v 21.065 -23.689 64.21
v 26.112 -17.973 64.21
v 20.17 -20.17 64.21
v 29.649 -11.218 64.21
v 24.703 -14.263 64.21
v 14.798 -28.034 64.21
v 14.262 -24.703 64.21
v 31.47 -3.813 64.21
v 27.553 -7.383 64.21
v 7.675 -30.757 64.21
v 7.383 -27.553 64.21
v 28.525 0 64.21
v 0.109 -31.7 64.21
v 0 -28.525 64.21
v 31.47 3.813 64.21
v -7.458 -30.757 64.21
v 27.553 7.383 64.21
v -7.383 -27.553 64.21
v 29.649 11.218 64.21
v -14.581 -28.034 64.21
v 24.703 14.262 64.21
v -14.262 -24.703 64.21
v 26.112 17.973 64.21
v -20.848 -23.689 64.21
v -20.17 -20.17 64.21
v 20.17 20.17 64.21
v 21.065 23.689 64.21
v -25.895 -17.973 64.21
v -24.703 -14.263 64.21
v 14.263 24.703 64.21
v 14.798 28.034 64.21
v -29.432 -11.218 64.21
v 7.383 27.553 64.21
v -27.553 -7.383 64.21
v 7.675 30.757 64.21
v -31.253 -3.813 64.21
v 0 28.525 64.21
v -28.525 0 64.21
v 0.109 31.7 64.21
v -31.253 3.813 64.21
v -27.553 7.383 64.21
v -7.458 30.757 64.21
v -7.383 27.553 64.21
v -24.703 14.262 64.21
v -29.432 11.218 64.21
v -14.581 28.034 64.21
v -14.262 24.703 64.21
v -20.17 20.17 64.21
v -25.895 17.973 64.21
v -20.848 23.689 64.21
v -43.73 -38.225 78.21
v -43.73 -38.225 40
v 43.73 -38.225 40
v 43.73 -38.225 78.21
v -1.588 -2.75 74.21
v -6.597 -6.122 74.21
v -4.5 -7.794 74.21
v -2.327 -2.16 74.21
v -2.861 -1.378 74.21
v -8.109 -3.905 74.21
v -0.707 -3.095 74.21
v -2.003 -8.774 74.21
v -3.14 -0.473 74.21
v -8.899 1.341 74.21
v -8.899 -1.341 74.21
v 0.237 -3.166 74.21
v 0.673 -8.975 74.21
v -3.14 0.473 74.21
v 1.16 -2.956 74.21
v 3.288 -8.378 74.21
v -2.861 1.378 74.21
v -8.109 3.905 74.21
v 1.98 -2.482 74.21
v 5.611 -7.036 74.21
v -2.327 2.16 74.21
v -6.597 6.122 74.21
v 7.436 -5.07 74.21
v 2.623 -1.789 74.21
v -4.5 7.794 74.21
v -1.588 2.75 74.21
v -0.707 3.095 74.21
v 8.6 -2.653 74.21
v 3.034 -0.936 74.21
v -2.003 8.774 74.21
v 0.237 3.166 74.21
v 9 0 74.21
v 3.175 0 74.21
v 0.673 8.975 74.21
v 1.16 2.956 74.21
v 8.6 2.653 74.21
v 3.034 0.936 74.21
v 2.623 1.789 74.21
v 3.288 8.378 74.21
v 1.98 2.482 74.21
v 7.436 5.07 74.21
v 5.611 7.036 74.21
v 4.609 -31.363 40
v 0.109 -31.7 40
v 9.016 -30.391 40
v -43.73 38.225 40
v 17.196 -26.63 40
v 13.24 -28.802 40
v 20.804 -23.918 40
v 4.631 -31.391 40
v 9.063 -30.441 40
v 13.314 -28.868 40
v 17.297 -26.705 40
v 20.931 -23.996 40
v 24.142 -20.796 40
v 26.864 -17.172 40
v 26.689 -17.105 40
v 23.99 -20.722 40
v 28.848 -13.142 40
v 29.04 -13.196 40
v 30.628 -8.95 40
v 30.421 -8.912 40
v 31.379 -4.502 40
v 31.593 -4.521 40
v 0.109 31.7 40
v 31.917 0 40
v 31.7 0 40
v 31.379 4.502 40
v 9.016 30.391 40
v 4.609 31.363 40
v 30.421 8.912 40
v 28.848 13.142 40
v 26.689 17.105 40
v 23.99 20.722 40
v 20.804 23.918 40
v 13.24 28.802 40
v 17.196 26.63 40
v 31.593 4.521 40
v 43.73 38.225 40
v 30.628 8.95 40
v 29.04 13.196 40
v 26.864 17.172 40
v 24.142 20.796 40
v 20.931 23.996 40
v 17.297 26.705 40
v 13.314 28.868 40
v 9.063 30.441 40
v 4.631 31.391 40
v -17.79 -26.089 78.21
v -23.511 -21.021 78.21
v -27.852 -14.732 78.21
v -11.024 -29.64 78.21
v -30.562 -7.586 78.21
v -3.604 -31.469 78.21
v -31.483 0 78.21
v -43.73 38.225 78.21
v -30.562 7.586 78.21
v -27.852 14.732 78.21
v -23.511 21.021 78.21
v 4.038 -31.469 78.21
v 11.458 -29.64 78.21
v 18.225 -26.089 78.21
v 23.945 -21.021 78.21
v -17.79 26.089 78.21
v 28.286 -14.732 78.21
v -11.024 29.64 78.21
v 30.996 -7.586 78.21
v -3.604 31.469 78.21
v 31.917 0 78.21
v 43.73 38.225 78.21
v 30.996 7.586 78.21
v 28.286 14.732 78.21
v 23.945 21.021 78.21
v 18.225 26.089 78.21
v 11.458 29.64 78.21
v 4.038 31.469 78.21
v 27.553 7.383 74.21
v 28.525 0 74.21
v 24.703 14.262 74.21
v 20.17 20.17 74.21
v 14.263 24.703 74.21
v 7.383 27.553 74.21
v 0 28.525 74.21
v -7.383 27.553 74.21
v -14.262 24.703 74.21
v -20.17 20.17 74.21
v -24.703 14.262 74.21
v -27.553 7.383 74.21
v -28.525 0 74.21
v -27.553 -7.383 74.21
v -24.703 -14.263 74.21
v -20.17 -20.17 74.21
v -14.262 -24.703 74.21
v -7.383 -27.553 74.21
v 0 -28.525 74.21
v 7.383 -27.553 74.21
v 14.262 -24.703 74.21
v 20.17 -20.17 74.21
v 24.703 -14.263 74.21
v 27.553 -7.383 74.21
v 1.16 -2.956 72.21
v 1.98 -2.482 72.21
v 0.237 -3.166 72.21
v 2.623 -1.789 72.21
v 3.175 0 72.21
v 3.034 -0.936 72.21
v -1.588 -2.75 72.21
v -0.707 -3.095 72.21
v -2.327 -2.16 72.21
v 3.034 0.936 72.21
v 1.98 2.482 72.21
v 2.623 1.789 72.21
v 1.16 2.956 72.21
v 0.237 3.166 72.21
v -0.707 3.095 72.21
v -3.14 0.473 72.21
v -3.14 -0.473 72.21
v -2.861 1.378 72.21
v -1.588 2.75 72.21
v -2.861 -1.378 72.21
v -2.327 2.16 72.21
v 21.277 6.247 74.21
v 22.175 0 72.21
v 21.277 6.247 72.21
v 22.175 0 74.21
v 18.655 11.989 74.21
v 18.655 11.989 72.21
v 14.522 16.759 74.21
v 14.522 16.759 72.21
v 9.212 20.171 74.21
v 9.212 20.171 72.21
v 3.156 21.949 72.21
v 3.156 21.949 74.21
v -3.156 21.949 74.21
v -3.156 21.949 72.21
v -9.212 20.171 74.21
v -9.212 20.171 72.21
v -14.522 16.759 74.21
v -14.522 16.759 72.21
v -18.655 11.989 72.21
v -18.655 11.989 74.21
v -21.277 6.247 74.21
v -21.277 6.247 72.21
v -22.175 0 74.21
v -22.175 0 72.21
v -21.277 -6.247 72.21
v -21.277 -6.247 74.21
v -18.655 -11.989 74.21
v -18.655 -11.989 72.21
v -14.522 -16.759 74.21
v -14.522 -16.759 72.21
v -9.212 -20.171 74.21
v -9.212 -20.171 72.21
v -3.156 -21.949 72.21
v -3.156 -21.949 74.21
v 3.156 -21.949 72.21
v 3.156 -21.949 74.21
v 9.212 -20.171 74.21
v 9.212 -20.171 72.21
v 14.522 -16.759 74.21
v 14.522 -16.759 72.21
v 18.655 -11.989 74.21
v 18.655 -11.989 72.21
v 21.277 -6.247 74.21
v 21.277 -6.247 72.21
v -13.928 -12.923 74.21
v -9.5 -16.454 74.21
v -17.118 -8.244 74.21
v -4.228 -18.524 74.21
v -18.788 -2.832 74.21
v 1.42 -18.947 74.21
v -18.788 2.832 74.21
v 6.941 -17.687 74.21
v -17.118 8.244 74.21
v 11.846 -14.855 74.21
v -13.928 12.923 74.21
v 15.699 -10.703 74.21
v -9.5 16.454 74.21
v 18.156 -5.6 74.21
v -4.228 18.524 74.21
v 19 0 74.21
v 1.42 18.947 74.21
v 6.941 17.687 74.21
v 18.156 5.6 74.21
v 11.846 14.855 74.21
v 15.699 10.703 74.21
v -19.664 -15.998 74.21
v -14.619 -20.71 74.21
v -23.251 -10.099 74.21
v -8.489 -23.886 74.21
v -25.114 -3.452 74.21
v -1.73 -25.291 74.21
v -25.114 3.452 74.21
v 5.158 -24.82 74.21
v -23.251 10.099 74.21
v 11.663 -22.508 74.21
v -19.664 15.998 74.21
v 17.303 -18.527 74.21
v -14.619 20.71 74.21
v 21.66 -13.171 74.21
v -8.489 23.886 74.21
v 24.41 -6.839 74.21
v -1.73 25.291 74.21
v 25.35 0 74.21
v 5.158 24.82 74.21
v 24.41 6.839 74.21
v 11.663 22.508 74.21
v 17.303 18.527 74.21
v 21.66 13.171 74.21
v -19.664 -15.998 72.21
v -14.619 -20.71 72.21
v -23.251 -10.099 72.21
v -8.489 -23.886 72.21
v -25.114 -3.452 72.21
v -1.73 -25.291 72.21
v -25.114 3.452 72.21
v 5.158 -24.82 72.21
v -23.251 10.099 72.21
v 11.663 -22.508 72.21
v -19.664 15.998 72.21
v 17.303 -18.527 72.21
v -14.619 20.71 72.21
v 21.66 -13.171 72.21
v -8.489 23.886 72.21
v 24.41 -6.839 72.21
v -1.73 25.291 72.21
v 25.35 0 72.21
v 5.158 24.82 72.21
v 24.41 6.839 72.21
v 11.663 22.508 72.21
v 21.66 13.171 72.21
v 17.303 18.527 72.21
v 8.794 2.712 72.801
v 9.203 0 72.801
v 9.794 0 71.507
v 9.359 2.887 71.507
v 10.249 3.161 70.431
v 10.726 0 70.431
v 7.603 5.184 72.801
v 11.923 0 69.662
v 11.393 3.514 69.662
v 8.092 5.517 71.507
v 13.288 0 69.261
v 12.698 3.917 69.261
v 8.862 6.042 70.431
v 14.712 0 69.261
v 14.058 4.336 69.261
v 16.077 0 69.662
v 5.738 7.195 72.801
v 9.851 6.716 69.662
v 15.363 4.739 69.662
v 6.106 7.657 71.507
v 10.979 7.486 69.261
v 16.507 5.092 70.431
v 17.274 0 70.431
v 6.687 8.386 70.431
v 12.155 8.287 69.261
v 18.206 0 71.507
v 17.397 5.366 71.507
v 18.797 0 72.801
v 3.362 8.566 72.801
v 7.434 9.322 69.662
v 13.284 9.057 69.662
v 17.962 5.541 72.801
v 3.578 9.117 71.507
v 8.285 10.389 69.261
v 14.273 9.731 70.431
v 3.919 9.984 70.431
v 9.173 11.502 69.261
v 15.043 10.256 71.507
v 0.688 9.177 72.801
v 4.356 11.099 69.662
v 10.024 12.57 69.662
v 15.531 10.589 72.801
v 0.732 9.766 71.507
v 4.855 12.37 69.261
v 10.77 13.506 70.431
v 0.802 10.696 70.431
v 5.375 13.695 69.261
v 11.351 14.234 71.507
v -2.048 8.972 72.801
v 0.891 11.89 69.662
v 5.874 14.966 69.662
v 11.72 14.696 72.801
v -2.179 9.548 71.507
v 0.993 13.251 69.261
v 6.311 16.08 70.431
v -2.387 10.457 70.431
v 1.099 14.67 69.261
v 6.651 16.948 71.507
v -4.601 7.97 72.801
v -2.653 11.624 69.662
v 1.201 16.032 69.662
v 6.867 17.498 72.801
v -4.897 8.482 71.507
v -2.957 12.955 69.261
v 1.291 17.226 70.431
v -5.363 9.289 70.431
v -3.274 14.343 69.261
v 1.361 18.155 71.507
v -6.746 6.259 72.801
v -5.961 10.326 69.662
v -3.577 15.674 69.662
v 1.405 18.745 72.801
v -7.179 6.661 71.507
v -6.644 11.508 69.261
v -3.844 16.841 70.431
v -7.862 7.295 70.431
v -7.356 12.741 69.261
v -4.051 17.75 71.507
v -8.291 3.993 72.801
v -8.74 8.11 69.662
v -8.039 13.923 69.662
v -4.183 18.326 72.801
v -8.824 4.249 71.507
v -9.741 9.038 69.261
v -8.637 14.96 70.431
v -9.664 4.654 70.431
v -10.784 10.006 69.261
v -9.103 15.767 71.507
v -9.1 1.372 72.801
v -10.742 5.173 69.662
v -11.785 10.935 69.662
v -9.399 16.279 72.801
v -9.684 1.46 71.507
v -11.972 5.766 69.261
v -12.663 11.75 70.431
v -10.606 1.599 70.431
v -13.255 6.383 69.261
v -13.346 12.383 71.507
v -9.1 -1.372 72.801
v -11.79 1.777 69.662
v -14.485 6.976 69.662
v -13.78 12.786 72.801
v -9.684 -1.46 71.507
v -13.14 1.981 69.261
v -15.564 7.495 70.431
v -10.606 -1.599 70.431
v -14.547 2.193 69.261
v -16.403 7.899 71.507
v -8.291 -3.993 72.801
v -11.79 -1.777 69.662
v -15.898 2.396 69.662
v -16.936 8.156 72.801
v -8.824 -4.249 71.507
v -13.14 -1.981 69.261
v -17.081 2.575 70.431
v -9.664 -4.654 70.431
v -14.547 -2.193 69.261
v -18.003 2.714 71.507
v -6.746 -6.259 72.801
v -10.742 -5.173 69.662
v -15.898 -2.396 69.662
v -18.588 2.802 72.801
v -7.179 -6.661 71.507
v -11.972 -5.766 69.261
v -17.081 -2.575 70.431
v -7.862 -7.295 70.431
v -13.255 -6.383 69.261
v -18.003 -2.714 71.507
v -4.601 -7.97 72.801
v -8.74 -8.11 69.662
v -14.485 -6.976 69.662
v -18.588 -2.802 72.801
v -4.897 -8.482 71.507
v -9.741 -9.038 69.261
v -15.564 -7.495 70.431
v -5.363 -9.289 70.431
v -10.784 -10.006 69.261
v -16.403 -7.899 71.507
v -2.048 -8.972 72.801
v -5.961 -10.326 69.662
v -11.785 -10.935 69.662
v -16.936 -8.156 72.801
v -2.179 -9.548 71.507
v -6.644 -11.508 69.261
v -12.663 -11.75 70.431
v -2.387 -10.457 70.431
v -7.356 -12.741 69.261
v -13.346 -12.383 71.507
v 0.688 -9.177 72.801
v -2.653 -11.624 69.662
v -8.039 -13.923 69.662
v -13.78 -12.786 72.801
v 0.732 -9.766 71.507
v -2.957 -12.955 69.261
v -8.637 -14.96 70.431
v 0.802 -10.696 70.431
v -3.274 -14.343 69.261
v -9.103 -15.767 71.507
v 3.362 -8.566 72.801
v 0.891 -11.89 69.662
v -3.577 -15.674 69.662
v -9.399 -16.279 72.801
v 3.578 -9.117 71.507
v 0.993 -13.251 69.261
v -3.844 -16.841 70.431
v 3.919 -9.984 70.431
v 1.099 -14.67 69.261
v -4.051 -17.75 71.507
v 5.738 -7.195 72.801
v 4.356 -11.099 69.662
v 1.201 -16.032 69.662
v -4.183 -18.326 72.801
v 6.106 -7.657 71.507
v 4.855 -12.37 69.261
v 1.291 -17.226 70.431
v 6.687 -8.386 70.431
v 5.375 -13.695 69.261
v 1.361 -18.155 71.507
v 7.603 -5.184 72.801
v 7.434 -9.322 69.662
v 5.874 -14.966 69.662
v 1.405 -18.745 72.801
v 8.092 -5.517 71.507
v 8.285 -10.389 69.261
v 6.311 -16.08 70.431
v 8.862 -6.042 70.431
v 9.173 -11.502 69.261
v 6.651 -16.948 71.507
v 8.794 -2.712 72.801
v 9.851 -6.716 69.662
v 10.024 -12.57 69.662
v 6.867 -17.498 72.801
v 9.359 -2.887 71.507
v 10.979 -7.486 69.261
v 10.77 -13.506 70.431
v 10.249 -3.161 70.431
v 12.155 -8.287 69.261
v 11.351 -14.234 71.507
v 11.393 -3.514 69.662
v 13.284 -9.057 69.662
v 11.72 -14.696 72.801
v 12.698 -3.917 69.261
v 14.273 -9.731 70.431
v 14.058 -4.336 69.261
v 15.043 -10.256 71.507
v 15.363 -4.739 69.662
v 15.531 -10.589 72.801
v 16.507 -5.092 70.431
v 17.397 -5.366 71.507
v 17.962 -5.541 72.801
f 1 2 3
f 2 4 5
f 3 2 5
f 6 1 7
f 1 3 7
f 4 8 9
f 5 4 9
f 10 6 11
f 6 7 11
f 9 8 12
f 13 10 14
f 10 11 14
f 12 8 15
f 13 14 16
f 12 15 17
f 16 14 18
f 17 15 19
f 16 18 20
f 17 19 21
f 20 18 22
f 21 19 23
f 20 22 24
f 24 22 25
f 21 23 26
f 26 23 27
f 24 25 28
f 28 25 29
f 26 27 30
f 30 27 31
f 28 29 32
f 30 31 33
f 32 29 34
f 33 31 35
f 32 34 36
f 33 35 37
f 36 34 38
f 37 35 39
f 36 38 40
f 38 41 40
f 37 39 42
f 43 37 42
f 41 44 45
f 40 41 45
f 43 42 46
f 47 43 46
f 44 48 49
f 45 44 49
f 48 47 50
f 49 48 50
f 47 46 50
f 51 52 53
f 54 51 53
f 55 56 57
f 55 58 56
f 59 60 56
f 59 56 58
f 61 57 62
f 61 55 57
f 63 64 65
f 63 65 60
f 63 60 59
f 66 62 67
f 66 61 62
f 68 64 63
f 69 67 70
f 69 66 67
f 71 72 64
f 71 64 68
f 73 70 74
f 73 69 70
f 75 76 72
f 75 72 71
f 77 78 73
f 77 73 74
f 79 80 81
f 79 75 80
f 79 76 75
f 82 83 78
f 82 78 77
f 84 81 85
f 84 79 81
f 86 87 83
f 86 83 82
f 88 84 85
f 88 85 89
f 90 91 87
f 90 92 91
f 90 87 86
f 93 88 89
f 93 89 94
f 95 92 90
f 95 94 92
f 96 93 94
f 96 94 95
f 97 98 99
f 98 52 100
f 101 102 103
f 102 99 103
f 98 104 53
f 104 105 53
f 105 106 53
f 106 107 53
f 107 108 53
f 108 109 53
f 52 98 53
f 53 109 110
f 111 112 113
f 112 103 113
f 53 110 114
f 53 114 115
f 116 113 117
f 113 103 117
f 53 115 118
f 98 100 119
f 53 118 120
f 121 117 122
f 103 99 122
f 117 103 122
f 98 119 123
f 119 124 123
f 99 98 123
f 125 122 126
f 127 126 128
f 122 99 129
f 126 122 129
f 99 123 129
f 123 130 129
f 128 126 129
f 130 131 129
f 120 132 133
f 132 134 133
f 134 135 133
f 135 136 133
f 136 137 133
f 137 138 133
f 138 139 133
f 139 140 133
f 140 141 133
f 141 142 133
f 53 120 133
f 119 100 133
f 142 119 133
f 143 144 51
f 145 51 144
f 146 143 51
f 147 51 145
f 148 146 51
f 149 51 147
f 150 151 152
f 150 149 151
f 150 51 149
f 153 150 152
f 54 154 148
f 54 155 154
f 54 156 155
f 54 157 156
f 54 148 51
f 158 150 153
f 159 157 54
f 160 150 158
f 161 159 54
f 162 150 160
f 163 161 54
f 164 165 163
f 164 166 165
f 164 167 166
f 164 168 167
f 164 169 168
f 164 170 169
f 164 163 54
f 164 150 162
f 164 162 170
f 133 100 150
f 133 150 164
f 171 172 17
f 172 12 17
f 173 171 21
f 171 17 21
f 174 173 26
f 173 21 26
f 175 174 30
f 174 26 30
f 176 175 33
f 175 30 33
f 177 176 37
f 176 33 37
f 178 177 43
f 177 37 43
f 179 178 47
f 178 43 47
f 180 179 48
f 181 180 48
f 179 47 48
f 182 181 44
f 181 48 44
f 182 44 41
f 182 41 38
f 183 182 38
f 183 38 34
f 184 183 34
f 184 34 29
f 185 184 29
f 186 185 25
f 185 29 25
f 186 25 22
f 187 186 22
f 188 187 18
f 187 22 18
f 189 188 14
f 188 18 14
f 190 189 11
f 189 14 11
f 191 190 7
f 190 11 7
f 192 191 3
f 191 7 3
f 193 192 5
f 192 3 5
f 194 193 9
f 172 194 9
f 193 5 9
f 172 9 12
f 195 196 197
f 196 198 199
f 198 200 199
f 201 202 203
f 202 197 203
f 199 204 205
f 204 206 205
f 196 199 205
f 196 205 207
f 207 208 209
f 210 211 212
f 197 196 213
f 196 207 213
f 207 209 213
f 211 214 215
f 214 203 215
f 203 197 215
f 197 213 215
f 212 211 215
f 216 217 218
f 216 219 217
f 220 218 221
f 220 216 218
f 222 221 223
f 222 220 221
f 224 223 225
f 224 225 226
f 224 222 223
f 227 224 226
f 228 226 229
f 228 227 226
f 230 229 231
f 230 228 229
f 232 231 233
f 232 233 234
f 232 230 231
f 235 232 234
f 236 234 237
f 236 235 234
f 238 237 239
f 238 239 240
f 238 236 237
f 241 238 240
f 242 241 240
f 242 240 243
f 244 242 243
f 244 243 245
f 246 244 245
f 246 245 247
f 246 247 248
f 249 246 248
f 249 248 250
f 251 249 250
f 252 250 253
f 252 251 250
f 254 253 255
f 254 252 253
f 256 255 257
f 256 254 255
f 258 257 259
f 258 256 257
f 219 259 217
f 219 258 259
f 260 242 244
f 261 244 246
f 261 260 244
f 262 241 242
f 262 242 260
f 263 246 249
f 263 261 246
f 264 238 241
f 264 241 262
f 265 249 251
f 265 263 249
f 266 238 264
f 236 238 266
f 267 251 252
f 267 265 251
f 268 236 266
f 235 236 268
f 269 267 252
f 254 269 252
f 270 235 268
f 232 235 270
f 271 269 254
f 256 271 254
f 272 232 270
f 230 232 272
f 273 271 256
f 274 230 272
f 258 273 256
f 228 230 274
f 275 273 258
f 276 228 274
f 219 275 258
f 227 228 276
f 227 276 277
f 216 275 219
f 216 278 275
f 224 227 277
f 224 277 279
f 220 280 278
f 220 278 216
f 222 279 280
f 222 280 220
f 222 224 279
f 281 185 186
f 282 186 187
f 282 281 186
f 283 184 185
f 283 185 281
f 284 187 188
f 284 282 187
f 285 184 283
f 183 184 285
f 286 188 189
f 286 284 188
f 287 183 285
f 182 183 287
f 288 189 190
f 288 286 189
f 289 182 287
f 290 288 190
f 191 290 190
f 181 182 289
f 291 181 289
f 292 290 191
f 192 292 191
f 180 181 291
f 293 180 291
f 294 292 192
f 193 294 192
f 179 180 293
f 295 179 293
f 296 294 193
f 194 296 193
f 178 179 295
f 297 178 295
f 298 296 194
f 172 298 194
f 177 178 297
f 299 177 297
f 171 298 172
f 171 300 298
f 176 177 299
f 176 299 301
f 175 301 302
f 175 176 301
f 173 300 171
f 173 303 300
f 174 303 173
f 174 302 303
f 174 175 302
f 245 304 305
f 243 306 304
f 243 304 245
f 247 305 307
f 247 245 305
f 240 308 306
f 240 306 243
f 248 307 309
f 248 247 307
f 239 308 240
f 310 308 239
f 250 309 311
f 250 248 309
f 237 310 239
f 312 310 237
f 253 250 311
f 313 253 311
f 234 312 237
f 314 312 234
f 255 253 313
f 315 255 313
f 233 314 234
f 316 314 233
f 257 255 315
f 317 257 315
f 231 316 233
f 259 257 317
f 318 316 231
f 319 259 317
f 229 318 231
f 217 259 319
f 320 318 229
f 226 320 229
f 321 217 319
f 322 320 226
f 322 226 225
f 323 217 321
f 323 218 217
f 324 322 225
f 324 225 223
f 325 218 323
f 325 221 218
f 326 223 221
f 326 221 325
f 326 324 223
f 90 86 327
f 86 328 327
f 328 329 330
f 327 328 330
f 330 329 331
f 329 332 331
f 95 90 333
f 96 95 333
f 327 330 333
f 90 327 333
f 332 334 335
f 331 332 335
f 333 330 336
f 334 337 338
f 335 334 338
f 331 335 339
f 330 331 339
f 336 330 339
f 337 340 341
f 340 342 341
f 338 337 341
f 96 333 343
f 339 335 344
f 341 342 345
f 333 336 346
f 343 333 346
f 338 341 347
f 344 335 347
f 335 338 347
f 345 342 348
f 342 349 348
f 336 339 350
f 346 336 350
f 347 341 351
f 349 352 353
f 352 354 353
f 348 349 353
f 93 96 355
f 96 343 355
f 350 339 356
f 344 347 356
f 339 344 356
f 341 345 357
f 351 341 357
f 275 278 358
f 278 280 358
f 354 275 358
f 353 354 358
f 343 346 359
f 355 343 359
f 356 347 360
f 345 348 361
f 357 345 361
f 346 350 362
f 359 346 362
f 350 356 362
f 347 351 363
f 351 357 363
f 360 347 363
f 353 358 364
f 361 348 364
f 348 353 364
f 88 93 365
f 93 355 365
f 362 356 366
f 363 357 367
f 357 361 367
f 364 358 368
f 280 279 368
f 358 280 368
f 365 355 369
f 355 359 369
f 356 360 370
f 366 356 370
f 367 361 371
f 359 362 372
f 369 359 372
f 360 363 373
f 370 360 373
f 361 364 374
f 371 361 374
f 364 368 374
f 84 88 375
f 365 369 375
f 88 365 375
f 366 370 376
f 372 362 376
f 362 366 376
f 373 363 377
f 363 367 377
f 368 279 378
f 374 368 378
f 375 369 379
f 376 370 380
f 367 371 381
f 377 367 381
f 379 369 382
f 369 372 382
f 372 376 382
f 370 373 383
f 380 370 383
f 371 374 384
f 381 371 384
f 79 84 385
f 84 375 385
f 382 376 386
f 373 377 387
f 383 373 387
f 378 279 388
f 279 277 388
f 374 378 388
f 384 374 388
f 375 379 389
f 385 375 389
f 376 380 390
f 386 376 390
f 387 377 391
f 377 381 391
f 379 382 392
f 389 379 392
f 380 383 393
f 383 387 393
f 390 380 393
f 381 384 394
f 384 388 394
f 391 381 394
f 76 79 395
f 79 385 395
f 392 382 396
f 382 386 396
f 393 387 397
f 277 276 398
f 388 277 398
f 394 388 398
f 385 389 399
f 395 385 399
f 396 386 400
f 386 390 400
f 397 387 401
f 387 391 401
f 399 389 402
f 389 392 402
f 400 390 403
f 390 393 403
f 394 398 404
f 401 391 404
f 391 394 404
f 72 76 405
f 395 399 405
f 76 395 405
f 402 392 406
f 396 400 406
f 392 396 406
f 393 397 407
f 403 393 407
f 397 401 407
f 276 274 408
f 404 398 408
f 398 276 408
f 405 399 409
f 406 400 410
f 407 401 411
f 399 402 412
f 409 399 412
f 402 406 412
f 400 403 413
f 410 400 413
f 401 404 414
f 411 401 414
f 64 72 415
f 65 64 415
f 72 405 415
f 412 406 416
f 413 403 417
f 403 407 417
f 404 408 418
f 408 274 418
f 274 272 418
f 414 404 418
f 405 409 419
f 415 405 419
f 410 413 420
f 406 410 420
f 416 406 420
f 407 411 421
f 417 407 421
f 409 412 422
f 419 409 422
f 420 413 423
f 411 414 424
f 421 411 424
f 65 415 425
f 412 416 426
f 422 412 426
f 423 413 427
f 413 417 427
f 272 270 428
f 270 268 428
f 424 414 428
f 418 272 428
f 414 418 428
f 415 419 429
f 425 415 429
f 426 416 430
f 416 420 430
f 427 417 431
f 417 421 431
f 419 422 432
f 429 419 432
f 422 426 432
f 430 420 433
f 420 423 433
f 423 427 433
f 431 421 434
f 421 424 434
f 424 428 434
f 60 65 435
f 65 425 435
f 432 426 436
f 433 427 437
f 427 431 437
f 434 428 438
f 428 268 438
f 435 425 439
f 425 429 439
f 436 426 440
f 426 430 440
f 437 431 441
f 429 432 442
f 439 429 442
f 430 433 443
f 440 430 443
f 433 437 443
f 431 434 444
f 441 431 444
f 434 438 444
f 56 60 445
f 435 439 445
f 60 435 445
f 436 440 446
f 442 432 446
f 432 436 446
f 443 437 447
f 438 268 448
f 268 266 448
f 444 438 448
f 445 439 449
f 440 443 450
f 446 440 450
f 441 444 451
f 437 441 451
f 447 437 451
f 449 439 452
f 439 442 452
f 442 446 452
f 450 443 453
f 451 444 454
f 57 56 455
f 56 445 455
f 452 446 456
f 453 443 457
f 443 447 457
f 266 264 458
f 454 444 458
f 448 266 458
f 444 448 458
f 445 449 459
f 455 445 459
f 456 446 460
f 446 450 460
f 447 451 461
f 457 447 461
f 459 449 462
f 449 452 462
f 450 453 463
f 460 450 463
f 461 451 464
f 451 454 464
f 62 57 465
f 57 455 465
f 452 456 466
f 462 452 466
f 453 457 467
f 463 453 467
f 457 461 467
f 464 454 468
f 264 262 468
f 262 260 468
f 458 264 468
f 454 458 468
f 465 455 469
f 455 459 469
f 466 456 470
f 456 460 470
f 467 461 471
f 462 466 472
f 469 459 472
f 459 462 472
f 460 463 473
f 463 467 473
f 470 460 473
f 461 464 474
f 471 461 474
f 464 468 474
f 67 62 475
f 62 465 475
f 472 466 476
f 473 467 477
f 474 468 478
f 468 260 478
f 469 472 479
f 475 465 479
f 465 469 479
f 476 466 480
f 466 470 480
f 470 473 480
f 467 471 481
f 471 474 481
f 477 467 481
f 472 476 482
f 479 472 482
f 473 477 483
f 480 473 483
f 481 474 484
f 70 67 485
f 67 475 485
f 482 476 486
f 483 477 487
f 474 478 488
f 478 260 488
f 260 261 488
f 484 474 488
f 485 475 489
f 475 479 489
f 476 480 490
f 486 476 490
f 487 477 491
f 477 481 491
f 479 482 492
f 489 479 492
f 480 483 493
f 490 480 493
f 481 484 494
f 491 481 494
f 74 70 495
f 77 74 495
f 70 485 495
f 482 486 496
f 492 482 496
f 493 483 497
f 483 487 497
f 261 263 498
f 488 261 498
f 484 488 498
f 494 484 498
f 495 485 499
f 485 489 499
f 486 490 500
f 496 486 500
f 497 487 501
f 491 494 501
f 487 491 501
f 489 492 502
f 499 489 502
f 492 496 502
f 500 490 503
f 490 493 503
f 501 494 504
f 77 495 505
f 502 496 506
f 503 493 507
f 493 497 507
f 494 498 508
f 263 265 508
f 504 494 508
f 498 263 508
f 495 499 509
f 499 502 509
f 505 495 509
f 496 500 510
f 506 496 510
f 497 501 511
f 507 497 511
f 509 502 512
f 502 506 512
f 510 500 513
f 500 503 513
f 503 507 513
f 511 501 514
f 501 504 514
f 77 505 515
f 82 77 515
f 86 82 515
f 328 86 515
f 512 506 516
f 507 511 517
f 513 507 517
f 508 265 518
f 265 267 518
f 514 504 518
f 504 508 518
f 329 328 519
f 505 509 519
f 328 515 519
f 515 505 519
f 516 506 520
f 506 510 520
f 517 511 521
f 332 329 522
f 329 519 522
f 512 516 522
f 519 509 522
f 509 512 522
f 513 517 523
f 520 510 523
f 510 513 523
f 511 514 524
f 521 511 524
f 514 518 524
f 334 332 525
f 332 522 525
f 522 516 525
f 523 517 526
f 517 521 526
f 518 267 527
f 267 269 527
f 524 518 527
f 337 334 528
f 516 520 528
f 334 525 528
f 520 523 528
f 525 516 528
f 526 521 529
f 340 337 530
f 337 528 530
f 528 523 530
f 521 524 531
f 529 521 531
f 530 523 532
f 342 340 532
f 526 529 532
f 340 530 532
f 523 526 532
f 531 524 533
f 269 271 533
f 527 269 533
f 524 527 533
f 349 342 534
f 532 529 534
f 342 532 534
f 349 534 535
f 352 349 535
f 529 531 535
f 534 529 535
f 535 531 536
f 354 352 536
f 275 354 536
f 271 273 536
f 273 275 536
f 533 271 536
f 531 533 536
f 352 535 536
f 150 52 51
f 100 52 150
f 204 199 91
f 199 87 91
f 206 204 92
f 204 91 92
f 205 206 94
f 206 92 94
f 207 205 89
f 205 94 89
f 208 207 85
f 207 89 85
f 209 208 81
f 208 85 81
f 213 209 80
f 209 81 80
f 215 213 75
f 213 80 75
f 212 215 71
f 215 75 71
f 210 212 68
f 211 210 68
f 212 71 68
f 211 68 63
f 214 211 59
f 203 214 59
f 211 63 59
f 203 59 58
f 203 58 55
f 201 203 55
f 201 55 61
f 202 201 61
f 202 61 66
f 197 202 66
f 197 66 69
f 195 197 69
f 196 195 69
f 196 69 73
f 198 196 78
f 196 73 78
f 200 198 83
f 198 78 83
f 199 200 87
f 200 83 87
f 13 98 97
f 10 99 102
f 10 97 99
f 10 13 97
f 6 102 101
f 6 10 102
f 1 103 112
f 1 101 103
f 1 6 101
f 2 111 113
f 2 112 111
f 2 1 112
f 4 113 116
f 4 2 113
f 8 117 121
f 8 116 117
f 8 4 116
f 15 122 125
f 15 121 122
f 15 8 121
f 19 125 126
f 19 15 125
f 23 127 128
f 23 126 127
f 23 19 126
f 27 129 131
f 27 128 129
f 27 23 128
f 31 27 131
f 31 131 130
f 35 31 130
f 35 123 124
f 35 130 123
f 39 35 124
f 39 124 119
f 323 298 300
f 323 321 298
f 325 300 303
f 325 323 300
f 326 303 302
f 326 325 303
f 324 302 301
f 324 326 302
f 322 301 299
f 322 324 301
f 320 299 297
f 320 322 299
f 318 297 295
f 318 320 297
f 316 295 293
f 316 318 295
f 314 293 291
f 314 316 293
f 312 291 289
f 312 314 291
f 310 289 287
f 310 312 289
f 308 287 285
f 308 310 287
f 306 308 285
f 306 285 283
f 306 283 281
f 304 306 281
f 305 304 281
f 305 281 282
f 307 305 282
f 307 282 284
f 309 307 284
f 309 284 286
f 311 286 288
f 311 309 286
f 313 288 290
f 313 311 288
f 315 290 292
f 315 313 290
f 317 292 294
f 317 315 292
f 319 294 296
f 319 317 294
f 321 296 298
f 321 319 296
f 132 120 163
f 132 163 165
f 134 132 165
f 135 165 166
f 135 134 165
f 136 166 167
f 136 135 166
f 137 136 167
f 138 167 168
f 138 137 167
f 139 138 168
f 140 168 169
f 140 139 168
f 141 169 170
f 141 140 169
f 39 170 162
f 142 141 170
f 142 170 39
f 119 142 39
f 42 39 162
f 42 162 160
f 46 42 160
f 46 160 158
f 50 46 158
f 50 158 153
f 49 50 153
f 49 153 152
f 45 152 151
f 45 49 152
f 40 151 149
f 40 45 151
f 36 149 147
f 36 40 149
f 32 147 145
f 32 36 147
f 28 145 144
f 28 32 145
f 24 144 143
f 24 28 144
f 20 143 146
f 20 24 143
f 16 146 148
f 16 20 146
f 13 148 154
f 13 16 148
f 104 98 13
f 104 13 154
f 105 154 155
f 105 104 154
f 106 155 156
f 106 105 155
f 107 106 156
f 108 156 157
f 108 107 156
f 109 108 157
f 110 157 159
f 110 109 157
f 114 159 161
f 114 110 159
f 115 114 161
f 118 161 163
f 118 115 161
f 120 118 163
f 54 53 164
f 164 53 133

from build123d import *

# Parameters (mm, degrees)
SKETCH003_W = 87.46
SKETCH003_H = 76.45
SKETCH003_R = 31.7
PAD_DEPTH   = 38.21


with BuildPart() as female_shell:
    # Sketch003 → Pad (new body)
    with BuildSketch(Plane.XY):
        Rectangle(SKETCH003_W, SKETCH003_H)
        with Locations((0.217197, 0)):
            Circle(SKETCH003_R, mode=Mode.SUBTRACT)
    extrude(amount=PAD_DEPTH)


with BuildPart() as female_shell_1:
    # Body002 placement: moved
    add(female_shell.part.moved(Location((0, 0, 40))))


with BuildPart() as female_part:
    # Sketch002 → Revolution002 (revolve)
    with BuildSketch(Plane.XZ):
        with BuildLine():
            Line((0, 40), (31.7, 40))
            Line((31.7, 40), (31.7, 64.21))
            Line((28.525, 64.21), (31.7, 64.21))
            Line((28.525, 74.21), (28.525, 64.21))
            Line((28.525, 74.21), (25.35, 74.21))
            Line((25.35, 74.21), (25.35, 72.21))
            Line((25.35, 72.21), (22.175, 72.21))
            Line((22.175, 72.21), (22.175, 74.21))
            Line((22.175, 74.21), (19, 74.21))
            ThreePointArc((9, 74.21), (14, 69.21), (19, 74.21))
            Line((9, 74.21), (3.175, 74.21))
            Line((3.175, 72.21), (3.175, 74.21))
            Line((0, 72.21), (3.175, 72.21))
            Line((0, 72.21), (0, 40))
        make_face()
    revolve(axis=Axis((0, 0, 0), (0, 0, 1)))

    # Boolean: union female-shell
    add(female_shell_1.part)


solid = female_part.part
